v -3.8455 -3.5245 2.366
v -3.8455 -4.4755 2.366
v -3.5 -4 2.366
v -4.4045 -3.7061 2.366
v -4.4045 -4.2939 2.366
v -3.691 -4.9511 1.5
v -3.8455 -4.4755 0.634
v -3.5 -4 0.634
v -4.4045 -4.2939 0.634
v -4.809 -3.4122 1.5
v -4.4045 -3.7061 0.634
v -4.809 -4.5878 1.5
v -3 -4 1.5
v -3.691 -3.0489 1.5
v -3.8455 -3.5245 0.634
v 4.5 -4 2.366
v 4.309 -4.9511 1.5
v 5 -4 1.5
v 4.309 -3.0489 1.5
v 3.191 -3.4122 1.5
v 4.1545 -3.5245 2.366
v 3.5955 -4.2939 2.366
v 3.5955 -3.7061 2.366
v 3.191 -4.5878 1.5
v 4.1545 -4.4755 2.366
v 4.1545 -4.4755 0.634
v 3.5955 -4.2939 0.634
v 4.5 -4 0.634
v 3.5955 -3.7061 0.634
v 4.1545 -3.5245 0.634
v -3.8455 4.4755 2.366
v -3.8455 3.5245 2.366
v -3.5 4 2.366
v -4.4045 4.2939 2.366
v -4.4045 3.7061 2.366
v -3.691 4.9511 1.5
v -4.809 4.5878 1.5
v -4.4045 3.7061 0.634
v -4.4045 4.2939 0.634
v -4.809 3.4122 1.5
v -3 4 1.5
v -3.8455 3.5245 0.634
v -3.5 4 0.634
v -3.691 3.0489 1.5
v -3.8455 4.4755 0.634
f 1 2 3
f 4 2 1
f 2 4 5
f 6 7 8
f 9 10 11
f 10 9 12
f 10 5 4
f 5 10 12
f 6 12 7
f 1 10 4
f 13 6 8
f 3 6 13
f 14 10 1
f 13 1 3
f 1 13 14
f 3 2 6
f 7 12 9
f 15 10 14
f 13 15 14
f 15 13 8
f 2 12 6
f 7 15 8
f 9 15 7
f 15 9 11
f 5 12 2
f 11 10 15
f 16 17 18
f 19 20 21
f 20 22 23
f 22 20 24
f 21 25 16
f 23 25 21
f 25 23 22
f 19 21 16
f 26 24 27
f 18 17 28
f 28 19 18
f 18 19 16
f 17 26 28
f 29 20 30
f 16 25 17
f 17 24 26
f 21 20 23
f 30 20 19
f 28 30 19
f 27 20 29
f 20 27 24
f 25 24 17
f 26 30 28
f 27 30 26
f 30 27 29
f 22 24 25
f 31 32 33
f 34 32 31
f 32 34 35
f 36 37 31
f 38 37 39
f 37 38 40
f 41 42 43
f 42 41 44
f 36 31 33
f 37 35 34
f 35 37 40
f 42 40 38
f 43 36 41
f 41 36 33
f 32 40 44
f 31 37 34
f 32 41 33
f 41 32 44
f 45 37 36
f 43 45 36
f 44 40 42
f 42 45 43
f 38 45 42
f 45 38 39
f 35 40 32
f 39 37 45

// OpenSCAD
union() {
	translate([-4, -4, 1.5]) sphere(r=1);
	translate([4, -4, 1.5]) sphere(r=1);
	translate([-4, 4, 1.5]) sphere(r=1);
}
